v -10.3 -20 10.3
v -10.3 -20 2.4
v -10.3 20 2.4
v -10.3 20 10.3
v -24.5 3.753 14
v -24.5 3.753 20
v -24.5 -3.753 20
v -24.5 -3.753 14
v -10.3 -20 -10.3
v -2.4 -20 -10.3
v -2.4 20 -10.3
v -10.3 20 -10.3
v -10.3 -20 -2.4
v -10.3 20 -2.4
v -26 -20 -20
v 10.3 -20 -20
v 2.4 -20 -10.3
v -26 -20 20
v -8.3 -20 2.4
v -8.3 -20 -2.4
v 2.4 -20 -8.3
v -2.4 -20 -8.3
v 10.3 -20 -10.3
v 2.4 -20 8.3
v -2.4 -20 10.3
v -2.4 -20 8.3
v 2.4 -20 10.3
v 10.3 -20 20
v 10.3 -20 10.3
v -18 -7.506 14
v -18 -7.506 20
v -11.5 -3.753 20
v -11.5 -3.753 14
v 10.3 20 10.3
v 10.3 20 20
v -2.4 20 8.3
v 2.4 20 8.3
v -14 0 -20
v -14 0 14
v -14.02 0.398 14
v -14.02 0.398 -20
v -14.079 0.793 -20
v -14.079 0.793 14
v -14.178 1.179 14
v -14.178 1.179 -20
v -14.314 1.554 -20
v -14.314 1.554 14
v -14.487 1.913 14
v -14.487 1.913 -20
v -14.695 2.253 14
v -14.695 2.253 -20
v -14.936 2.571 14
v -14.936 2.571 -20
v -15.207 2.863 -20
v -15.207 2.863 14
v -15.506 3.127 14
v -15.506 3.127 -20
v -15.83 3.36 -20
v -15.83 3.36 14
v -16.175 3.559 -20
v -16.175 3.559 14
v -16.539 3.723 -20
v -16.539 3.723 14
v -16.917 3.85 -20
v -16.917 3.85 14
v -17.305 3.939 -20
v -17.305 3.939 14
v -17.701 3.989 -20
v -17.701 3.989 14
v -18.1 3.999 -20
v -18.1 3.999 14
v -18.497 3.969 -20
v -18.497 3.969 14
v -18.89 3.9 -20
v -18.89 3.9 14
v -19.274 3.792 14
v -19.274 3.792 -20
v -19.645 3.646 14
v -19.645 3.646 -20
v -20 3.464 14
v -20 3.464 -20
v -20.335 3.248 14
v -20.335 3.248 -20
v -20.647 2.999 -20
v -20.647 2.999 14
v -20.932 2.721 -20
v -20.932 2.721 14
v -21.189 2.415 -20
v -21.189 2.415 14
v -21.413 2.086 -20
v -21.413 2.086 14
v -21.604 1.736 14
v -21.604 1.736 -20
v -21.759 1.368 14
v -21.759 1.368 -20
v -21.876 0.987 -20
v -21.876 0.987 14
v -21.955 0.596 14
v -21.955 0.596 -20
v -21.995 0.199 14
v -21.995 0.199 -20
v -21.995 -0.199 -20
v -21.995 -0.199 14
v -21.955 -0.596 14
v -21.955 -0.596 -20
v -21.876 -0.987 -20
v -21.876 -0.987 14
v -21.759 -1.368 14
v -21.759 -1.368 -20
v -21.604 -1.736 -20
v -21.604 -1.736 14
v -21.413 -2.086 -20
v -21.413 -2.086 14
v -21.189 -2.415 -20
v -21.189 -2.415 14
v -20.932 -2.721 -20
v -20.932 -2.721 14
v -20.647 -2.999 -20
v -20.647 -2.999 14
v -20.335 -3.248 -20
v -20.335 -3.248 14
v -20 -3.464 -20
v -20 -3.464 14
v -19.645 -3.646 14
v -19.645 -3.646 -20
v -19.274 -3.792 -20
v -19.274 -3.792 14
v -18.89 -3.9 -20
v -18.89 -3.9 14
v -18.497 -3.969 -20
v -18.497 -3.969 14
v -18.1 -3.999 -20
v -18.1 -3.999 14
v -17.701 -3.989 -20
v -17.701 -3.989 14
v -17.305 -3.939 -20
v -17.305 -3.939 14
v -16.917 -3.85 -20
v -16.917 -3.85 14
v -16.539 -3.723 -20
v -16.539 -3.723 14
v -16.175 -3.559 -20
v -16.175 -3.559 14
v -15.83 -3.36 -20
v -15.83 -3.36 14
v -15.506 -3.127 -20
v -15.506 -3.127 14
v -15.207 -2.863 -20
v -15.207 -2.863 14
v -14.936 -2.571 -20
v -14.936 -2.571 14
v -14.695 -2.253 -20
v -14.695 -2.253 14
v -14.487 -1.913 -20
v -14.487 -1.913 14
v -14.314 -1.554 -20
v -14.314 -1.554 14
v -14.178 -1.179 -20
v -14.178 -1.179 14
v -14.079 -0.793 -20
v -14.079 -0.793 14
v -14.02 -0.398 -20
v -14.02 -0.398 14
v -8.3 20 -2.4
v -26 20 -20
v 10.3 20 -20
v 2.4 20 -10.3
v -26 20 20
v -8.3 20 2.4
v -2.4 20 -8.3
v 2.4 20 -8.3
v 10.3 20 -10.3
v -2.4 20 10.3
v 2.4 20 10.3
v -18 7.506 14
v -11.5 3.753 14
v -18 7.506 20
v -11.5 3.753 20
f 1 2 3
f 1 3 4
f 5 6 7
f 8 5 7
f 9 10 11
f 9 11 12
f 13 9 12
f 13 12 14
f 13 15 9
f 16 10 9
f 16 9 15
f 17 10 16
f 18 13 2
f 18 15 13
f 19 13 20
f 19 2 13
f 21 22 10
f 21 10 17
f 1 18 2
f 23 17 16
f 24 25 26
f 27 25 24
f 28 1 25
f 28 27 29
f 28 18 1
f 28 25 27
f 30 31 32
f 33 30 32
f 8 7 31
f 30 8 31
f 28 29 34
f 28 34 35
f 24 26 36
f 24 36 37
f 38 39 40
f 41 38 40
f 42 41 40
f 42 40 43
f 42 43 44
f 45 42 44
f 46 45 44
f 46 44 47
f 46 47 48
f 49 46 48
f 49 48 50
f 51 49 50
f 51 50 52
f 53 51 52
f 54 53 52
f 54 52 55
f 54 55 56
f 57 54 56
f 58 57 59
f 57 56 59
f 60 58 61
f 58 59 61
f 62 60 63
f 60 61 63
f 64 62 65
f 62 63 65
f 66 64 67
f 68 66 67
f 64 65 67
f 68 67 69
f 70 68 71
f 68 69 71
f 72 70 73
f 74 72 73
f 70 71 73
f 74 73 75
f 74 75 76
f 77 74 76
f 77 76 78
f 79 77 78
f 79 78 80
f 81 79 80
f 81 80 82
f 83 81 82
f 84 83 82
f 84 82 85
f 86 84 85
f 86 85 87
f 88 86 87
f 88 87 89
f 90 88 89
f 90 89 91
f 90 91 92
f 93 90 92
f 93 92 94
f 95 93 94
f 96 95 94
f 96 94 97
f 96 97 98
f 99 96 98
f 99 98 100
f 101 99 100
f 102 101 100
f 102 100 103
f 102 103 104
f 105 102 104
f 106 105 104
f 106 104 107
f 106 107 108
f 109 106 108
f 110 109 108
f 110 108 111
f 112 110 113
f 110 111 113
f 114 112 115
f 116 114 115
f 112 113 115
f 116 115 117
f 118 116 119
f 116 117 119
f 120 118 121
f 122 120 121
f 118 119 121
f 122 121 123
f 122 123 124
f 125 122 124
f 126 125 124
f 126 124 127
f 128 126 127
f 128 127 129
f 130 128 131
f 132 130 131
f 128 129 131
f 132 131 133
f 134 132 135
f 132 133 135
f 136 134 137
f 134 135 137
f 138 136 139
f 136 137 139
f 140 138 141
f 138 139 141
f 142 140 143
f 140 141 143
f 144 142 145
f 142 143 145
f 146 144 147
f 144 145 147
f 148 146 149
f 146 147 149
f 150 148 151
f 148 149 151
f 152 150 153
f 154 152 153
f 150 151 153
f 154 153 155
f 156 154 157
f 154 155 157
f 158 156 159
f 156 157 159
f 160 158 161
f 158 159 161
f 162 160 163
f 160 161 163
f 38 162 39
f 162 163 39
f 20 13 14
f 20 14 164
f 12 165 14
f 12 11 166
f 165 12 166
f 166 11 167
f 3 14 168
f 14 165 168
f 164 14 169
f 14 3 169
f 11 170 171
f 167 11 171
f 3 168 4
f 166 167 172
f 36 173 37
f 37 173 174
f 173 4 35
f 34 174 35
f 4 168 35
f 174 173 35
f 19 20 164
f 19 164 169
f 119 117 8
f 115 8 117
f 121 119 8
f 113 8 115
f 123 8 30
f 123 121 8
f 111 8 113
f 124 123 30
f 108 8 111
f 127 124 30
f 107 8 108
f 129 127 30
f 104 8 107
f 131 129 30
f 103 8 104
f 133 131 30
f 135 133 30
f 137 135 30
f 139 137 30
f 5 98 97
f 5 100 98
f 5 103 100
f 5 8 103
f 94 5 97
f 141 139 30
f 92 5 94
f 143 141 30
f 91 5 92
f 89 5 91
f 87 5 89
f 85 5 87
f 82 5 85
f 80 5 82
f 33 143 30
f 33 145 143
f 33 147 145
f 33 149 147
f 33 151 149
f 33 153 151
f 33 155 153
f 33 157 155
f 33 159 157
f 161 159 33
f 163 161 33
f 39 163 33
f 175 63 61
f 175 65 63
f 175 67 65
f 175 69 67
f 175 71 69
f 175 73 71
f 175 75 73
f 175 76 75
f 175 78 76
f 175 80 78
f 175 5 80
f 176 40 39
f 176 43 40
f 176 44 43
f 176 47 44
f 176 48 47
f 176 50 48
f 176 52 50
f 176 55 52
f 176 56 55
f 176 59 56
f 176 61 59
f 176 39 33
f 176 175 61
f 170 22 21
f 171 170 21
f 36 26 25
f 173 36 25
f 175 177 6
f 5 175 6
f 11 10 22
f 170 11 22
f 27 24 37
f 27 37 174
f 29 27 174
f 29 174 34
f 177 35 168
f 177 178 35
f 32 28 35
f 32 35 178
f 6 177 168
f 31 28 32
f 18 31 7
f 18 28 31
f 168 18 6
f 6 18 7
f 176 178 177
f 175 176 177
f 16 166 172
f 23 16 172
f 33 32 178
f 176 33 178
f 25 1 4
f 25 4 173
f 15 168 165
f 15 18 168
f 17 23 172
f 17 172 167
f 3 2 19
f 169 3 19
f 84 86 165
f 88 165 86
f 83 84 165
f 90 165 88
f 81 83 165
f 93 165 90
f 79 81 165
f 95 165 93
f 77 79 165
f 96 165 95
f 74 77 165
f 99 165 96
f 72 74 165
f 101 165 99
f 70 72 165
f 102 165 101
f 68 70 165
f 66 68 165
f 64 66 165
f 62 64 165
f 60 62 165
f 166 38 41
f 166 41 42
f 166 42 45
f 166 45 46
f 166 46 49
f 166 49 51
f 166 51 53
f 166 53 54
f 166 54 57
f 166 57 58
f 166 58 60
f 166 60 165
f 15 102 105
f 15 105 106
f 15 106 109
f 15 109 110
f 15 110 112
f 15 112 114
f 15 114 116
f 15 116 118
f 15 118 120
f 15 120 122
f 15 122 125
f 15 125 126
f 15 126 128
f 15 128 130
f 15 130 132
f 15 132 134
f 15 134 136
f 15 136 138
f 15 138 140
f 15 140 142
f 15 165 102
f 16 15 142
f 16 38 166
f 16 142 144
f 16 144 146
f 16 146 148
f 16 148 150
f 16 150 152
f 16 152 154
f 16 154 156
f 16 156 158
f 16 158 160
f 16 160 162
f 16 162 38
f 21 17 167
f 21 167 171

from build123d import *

# Parameters (mm, degrees)
F0_W     = 4.8
F0_H     = 2
F0_W_2   = 2
F0_H_2   = 4.8
F1_DEPTH = 20
F2_R     = 4
F3_DEPTH = 50
F4_DEPTH = 6


with BuildPart() as f1:
    # F0 (on Front) → F1 (new body, symmetric)
    with BuildSketch(Plane.XZ):
        Polygon((10.3, -20), (10.3, -10.3), (2.4, -10.3), (-2.4, -10.3), (-10.3, -10.3), (-10.3, -2.4), (-10.3, 2.4), (-10.3, 10.3), (-2.4, 10.3), (2.4, 10.3), (10.3, 10.3), (10.3, 20), (-26, 20), (-26, -20), align=None)
        with Locations((0, -9.3)):
            Rectangle(F0_W, F0_H)
        with Locations((0, 9.3)):
            Rectangle(F0_W, F0_H)
        with Locations((-9.3, 0)):
            Rectangle(F0_W_2, F0_H_2)
    extrude(amount=F1_DEPTH, both=True)

    # F2 (on face) → F3 (cut)
    with BuildSketch(Plane.XY.offset(20)):
        with Locations((-18, 0)):
            Circle(F2_R)
    extrude(amount=-F3_DEPTH, mode=Mode.SUBTRACT)

    # F2 (on face) → F4 (cut)
    with BuildSketch(Plane.XY.offset(20)):
        Polygon((-11.5, -3.752777), (-11.5, 3.752777), (-18, 7.505553), (-24.5, 3.752777), (-24.5, -3.752777), (-18, -7.505553), align=None)
        with Locations((-18, 0)):
            Circle(F2_R, mode=Mode.SUBTRACT)
    extrude(amount=-F4_DEPTH, mode=Mode.SUBTRACT)


solid = f1.part
